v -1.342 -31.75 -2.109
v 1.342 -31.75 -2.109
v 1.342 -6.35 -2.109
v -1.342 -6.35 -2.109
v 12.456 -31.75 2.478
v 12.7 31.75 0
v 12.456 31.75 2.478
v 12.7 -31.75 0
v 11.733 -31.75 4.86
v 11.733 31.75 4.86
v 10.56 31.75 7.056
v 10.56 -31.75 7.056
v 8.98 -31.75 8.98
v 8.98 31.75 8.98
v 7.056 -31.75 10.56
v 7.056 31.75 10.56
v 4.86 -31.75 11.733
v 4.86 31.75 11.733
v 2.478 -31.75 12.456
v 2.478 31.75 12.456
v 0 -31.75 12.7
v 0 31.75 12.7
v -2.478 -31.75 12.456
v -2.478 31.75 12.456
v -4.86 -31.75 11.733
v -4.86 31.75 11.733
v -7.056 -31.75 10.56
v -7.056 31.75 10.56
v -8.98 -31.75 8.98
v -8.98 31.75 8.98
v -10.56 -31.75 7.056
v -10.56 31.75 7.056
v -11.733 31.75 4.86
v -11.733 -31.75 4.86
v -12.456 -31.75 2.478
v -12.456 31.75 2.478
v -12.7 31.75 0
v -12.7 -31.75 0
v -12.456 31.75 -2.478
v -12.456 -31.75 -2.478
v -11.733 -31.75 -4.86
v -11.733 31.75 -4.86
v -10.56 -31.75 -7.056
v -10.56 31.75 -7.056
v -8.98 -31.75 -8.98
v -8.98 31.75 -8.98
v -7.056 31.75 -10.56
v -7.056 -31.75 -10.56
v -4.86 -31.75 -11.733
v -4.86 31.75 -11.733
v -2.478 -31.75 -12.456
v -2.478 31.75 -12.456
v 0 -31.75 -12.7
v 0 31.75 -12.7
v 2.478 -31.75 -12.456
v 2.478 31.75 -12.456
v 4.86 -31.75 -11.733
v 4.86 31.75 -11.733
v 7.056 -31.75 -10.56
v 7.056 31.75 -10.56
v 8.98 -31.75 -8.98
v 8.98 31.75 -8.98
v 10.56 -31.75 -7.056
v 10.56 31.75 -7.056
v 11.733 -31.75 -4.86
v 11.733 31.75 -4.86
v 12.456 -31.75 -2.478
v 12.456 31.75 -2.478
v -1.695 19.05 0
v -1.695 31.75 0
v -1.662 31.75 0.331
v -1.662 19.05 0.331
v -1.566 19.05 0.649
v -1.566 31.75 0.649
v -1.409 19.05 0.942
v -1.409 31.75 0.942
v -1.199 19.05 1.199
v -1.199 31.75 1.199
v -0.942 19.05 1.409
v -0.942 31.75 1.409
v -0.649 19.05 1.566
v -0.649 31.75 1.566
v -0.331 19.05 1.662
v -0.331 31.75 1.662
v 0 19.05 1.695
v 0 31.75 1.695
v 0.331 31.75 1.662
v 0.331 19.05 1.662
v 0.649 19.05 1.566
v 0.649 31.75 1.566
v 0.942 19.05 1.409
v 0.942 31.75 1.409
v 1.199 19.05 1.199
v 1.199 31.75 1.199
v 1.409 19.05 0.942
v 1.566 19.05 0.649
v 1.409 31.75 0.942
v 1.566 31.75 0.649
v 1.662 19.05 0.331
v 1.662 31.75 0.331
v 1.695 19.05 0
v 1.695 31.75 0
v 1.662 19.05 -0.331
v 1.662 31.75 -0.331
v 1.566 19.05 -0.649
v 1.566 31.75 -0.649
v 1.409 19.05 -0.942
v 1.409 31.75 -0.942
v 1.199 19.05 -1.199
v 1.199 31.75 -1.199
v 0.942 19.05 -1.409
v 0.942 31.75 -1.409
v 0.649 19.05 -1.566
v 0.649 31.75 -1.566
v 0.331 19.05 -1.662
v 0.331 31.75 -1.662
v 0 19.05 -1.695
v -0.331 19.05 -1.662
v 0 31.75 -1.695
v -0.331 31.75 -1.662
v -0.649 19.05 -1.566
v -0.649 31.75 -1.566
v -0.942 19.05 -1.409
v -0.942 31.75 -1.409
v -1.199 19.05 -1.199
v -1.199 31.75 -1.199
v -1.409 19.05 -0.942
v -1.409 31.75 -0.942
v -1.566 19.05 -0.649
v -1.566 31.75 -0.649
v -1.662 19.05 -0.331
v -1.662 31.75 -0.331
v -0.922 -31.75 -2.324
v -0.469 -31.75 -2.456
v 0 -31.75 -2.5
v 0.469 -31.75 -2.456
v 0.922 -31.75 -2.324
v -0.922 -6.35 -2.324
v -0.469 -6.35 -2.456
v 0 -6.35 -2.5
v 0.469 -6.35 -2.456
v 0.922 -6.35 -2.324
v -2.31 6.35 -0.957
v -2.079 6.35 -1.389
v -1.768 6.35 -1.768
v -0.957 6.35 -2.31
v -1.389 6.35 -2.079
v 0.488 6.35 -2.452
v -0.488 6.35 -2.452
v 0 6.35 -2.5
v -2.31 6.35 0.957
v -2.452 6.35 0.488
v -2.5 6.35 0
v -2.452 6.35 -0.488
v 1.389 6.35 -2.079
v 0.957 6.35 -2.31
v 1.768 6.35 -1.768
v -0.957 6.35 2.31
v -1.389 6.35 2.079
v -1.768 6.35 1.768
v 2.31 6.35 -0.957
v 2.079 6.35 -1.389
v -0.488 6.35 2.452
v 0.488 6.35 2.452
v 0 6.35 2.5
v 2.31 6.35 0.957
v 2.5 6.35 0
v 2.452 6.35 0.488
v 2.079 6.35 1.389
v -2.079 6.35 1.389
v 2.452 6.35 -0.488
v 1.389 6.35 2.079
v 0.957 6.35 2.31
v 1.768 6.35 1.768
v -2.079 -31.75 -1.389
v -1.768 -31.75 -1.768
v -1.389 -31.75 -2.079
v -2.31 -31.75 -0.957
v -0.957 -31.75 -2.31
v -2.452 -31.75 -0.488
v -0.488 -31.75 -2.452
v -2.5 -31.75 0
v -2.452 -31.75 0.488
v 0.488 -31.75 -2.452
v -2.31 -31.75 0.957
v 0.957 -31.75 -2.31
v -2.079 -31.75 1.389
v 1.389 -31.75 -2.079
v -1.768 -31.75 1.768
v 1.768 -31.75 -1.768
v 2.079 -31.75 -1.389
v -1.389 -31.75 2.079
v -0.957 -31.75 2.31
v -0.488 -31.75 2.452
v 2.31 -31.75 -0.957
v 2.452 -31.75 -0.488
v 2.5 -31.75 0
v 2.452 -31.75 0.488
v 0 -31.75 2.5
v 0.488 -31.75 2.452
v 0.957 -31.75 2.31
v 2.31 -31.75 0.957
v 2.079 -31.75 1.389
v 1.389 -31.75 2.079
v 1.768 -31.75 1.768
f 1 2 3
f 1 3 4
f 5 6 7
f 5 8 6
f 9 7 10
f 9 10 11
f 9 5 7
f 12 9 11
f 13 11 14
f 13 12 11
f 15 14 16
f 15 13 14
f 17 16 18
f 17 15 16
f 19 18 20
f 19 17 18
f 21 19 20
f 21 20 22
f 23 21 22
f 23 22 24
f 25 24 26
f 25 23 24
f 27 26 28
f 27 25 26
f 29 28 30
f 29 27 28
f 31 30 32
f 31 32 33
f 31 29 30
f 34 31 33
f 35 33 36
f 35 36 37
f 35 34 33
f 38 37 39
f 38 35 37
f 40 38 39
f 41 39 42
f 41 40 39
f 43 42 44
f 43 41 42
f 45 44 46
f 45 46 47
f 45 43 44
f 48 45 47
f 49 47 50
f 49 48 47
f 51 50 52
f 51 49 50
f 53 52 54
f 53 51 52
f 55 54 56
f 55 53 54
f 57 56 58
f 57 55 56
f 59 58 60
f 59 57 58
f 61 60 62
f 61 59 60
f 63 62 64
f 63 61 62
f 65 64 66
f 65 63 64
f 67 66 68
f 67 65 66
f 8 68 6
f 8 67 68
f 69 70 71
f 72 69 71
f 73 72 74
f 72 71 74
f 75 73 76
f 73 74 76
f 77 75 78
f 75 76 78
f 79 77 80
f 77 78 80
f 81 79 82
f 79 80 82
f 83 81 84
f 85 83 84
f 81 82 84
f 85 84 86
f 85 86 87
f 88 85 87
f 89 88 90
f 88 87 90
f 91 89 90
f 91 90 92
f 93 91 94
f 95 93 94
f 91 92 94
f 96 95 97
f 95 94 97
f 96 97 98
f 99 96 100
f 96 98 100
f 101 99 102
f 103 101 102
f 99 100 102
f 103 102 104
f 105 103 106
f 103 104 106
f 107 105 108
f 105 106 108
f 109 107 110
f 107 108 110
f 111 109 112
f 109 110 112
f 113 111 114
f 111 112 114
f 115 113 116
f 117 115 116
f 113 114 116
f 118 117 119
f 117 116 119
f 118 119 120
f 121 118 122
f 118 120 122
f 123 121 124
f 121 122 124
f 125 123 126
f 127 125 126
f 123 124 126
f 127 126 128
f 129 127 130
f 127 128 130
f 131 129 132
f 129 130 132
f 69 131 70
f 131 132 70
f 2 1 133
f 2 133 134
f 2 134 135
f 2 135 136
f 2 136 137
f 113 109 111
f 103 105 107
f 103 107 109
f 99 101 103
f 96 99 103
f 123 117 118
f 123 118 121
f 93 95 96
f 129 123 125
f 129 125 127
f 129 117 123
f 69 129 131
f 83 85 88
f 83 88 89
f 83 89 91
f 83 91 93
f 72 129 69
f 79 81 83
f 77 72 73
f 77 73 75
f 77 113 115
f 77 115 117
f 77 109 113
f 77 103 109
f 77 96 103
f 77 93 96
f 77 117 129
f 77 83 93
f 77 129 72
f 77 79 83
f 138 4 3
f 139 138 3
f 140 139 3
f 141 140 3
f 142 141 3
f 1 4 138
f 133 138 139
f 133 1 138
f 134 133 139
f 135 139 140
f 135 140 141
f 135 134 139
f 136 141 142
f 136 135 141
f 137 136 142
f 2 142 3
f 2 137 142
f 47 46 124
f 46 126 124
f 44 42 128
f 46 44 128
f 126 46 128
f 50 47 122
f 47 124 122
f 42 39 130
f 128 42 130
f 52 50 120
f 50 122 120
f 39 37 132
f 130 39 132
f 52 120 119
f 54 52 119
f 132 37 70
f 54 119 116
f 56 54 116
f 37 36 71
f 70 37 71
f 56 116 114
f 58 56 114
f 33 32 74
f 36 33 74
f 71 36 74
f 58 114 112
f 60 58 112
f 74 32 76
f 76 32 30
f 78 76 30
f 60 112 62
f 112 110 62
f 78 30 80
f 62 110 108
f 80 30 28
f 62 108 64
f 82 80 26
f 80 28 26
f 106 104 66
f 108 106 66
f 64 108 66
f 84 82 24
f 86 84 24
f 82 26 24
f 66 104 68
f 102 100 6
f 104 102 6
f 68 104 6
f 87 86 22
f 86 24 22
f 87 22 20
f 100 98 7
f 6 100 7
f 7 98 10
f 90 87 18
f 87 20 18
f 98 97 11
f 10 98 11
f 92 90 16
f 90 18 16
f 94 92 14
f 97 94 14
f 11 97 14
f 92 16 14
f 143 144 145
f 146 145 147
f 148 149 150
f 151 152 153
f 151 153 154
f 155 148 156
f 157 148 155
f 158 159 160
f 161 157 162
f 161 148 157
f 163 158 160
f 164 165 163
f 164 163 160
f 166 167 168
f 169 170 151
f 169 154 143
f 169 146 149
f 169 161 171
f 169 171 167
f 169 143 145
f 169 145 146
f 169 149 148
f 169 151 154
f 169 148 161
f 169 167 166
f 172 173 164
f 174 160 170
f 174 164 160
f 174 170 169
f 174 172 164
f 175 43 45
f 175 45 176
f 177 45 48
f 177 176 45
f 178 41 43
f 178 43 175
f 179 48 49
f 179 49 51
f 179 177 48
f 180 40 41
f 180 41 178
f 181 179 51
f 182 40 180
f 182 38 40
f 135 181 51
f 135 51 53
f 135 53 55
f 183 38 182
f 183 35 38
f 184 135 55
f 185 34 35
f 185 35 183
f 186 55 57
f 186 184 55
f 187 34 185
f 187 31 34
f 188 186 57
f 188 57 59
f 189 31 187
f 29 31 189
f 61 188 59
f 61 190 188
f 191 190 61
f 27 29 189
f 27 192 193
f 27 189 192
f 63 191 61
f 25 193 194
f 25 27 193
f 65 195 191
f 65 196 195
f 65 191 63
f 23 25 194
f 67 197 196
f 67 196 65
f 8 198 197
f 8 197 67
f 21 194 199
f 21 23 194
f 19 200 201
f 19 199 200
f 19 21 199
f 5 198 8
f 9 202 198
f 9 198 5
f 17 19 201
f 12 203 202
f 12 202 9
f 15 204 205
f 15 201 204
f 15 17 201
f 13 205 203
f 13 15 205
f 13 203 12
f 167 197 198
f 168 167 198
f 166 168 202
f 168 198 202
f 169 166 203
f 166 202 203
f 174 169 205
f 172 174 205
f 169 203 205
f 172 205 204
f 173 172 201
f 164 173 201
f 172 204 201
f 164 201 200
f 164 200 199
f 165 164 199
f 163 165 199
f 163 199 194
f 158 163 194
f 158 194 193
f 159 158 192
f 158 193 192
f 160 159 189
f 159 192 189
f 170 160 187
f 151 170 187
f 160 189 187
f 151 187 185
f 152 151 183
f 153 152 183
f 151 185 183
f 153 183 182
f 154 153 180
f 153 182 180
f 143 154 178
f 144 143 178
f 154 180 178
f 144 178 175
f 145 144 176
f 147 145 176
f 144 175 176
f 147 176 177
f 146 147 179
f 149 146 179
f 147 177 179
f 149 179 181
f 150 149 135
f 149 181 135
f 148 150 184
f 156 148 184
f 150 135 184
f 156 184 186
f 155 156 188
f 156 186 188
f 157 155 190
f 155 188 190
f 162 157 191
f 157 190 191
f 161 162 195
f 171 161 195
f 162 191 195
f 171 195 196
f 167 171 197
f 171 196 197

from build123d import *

# Parameters (mm, degrees)
F0_R      = 10.16
F1_DEPTH  = 50.8
F2_R      = 0.25
F3_DEPTH  = 25.4
F5_R      = 12.7
F6_DEPTH  = 31.75
F7_R      = 2.5
F8_DEPTH  = 38.1
F10_DEPTH = 25.4
F11_R     = 1.695
F12_DEPTH = 12.7


with BuildPart() as f1:
    # F0 (on Front) → F1 (new body)
    with BuildSketch(Plane.XZ):
        Circle(F0_R)
    extrude(amount=F1_DEPTH)

    # F2 (on face) → F3 (cut)
    with BuildSketch(Plane.XZ.offset(50.8)):
        Circle(F2_R)
    extrude(amount=-F3_DEPTH, mode=Mode.SUBTRACT)


with BuildPart() as f6:
    # F5 (on Front) → F6 (new body, symmetric)
    with BuildSketch(Plane.XZ):
        Circle(F5_R)
    extrude(amount=F6_DEPTH, both=True)

    # F7 (on face) → F8 (cut)
    with BuildSketch(Plane.XZ.offset(31.75)):
        Circle(F7_R)
    extrude(amount=-F8_DEPTH, mode=Mode.SUBTRACT)

    # F11 (on face) → F12 (cut)
    with BuildSketch(Plane(origin=(0, 31.75, 0), x_dir=(-1, 0, 0), z_dir=(0, 1, 0))):
        Circle(F11_R)
    extrude(amount=-F12_DEPTH, mode=Mode.SUBTRACT)


with BuildPart() as f10:
    # F9 (on face) → F10 (new body)
    with BuildSketch(Plane.XZ.offset(31.75)):
        with BuildLine():
            Line((1.3416786525, -2.1094782278), (0, -2.1094782278))
            Line((0, -2.1094782278), (-1.3416786525, -2.1094782278))
            ThreePointArc((-1.3416786525, -2.1094782278), (0, -2.5), (1.3416786525, -2.1094782278))
        make_face()
    extrude(amount=-F10_DEPTH)


solid = Compound([f6.part, f10.part])
